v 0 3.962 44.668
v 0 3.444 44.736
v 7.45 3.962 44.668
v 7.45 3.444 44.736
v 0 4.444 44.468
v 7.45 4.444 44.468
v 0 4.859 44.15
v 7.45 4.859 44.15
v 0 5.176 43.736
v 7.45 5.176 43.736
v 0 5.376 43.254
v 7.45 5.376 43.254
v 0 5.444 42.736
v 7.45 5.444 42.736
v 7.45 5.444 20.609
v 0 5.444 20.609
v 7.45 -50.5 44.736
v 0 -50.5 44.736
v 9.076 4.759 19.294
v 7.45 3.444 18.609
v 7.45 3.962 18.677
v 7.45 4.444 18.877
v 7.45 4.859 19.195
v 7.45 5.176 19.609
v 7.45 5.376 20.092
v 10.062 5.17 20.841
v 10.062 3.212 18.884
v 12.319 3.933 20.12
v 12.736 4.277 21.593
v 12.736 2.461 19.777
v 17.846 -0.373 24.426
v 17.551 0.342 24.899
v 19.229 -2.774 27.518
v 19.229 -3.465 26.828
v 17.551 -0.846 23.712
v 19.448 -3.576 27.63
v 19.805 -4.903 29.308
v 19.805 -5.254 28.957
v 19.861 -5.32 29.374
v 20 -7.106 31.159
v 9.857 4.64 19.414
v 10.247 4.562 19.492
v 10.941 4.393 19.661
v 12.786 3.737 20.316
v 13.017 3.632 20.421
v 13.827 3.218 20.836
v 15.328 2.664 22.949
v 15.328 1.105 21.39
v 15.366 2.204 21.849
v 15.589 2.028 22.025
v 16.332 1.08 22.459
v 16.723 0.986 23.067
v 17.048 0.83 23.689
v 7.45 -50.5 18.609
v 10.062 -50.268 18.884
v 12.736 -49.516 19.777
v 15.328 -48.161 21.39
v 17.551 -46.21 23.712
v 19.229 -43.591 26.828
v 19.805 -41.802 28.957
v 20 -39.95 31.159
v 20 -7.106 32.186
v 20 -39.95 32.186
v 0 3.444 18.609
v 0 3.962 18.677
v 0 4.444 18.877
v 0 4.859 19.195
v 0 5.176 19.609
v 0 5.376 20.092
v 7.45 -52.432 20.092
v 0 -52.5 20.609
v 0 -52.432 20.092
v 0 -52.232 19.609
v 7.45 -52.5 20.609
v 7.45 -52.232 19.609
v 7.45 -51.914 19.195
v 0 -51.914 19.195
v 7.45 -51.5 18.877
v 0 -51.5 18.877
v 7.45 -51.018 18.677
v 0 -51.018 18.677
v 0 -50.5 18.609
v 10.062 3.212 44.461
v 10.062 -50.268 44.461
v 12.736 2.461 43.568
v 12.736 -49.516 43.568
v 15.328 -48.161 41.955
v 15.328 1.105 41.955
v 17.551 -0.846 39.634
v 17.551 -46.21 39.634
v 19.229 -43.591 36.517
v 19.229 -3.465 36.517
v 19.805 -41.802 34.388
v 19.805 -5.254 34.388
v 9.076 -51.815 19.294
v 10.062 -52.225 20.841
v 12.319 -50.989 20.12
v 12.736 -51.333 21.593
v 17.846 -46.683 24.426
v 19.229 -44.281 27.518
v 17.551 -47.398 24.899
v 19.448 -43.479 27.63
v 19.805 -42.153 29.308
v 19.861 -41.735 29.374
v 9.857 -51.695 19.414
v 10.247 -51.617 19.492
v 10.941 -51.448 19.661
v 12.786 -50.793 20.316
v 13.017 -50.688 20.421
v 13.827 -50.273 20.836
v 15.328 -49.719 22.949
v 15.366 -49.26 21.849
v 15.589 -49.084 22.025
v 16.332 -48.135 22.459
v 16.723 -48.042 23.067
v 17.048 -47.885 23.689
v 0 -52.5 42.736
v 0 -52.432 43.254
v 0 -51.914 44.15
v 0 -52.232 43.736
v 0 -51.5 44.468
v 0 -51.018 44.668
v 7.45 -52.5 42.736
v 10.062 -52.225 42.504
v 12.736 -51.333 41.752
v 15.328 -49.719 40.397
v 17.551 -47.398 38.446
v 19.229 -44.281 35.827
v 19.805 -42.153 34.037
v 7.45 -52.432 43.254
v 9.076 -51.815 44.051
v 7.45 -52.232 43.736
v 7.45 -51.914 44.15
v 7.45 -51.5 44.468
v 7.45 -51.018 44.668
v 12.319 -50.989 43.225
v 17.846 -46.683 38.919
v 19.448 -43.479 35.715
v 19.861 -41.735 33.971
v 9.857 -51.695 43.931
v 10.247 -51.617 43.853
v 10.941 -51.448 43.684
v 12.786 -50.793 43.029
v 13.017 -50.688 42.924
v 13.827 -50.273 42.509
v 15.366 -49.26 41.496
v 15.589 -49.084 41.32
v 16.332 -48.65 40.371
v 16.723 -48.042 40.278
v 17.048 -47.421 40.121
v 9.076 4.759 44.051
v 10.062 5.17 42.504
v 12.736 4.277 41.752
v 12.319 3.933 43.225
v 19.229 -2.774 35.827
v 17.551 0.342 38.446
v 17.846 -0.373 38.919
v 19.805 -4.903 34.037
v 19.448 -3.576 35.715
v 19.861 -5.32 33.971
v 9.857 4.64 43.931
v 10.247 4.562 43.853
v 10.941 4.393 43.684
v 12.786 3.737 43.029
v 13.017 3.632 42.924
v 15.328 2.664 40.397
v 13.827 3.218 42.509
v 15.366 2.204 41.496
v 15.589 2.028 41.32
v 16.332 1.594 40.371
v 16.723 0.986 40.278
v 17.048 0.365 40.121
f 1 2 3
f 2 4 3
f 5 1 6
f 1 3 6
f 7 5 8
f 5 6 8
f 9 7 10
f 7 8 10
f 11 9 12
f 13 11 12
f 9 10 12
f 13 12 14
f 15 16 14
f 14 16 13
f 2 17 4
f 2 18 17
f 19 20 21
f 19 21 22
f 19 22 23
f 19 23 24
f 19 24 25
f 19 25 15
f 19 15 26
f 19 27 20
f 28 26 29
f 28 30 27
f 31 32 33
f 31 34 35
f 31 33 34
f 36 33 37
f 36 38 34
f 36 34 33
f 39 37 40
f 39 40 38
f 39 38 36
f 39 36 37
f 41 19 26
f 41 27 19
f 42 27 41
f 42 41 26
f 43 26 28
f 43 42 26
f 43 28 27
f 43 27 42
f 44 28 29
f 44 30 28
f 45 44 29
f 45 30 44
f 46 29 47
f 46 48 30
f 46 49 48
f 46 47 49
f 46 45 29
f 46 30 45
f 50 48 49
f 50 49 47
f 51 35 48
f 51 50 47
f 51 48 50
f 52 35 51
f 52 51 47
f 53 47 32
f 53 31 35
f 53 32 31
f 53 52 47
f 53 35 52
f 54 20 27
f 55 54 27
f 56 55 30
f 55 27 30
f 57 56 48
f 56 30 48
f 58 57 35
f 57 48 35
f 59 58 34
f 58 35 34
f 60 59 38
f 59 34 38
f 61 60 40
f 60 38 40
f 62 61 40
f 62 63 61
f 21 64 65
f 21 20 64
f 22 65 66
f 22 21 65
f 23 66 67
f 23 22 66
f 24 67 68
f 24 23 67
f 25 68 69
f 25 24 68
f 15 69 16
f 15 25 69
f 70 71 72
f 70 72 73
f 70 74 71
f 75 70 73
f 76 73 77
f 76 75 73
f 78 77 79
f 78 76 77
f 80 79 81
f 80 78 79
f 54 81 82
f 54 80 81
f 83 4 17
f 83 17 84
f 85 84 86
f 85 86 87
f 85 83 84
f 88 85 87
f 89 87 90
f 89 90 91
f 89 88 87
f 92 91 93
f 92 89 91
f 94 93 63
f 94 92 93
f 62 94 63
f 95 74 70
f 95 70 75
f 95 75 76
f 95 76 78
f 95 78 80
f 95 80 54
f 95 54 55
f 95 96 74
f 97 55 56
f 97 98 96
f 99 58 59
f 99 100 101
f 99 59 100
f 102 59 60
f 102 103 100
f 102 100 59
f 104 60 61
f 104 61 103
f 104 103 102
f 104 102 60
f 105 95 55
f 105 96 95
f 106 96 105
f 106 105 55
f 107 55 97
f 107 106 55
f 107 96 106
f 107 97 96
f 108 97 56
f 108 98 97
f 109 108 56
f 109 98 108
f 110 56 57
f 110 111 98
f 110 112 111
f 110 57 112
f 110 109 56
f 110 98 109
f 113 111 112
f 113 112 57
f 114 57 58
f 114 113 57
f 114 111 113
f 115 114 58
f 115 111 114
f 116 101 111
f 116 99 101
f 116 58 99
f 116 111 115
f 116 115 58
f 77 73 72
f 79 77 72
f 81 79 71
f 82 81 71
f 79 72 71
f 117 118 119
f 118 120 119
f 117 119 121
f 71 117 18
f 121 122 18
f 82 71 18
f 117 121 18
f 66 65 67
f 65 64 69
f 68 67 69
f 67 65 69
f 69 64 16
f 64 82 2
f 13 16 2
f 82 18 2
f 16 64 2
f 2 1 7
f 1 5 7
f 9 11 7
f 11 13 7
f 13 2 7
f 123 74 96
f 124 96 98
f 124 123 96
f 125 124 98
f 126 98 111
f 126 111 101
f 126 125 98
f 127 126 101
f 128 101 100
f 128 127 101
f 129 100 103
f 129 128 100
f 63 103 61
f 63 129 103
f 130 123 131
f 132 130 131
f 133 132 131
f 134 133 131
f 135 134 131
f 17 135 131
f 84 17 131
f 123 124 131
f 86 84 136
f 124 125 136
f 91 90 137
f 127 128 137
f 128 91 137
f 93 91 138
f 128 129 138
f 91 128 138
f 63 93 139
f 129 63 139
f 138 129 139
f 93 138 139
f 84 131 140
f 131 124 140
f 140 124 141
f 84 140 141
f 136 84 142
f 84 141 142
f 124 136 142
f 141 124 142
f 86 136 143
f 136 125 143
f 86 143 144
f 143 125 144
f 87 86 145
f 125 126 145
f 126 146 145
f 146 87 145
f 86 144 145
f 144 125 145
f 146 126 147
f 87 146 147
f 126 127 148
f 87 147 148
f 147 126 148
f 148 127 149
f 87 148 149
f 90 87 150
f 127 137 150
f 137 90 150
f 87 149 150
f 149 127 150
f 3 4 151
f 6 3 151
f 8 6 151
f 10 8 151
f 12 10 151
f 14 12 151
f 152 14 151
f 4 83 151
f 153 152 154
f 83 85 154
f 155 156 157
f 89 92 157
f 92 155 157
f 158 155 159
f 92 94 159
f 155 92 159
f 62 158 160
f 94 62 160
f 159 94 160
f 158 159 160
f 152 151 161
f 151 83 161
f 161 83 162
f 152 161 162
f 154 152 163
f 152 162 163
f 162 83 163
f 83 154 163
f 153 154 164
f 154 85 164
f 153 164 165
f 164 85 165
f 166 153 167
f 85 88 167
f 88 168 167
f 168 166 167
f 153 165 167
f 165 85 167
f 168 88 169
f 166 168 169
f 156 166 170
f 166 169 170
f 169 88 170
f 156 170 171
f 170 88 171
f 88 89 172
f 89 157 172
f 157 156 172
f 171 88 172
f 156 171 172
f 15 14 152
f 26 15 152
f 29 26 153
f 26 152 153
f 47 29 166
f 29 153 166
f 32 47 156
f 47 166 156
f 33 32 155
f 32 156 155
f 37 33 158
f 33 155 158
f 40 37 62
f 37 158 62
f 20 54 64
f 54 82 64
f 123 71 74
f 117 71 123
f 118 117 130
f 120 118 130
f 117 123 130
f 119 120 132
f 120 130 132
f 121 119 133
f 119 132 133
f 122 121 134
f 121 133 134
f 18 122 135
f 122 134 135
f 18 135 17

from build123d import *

# Parameters (mm, degrees)
F0_W     = 57.9444081523
F0_H     = 26.1267647147
F1_DEPTH = 20
F2_R     = 12.55
F3_R     = 2


with BuildPart() as f1:
    # F0 (on Right) → F1 (new body)
    with BuildSketch(Plane.YZ):
        with Locations((-23.52779801, 31.6725373268)):
            Rectangle(F0_W, F0_H)
    extrude(amount=F1_DEPTH)

    # F2
    f2_edges = [f1.edges().sort_by_distance(p)[0] for p in [
        (20, -23.527798, 18.609155),
        (20, 5.444406, 31.672537),
        (20, -23.527798, 44.73592),
        (20, -52.500002, 31.672537),
    ]]
    fillet(f2_edges, radius=F2_R)

    # F3
    f3_edges = [f1.edges().sort_by_distance(p)[0] for p in [
        (20, -23.527798, 31.159155),
        (17.029365, -48.057916, 23.051241),
        (17.029365, -48.057916, 40.293833),
        (17.029365, 1.00232, 23.051241),
        (17.029365, 1.00232, 40.293833),
    ]]
    fillet(f3_edges, radius=F3_R)


solid = f1.part
